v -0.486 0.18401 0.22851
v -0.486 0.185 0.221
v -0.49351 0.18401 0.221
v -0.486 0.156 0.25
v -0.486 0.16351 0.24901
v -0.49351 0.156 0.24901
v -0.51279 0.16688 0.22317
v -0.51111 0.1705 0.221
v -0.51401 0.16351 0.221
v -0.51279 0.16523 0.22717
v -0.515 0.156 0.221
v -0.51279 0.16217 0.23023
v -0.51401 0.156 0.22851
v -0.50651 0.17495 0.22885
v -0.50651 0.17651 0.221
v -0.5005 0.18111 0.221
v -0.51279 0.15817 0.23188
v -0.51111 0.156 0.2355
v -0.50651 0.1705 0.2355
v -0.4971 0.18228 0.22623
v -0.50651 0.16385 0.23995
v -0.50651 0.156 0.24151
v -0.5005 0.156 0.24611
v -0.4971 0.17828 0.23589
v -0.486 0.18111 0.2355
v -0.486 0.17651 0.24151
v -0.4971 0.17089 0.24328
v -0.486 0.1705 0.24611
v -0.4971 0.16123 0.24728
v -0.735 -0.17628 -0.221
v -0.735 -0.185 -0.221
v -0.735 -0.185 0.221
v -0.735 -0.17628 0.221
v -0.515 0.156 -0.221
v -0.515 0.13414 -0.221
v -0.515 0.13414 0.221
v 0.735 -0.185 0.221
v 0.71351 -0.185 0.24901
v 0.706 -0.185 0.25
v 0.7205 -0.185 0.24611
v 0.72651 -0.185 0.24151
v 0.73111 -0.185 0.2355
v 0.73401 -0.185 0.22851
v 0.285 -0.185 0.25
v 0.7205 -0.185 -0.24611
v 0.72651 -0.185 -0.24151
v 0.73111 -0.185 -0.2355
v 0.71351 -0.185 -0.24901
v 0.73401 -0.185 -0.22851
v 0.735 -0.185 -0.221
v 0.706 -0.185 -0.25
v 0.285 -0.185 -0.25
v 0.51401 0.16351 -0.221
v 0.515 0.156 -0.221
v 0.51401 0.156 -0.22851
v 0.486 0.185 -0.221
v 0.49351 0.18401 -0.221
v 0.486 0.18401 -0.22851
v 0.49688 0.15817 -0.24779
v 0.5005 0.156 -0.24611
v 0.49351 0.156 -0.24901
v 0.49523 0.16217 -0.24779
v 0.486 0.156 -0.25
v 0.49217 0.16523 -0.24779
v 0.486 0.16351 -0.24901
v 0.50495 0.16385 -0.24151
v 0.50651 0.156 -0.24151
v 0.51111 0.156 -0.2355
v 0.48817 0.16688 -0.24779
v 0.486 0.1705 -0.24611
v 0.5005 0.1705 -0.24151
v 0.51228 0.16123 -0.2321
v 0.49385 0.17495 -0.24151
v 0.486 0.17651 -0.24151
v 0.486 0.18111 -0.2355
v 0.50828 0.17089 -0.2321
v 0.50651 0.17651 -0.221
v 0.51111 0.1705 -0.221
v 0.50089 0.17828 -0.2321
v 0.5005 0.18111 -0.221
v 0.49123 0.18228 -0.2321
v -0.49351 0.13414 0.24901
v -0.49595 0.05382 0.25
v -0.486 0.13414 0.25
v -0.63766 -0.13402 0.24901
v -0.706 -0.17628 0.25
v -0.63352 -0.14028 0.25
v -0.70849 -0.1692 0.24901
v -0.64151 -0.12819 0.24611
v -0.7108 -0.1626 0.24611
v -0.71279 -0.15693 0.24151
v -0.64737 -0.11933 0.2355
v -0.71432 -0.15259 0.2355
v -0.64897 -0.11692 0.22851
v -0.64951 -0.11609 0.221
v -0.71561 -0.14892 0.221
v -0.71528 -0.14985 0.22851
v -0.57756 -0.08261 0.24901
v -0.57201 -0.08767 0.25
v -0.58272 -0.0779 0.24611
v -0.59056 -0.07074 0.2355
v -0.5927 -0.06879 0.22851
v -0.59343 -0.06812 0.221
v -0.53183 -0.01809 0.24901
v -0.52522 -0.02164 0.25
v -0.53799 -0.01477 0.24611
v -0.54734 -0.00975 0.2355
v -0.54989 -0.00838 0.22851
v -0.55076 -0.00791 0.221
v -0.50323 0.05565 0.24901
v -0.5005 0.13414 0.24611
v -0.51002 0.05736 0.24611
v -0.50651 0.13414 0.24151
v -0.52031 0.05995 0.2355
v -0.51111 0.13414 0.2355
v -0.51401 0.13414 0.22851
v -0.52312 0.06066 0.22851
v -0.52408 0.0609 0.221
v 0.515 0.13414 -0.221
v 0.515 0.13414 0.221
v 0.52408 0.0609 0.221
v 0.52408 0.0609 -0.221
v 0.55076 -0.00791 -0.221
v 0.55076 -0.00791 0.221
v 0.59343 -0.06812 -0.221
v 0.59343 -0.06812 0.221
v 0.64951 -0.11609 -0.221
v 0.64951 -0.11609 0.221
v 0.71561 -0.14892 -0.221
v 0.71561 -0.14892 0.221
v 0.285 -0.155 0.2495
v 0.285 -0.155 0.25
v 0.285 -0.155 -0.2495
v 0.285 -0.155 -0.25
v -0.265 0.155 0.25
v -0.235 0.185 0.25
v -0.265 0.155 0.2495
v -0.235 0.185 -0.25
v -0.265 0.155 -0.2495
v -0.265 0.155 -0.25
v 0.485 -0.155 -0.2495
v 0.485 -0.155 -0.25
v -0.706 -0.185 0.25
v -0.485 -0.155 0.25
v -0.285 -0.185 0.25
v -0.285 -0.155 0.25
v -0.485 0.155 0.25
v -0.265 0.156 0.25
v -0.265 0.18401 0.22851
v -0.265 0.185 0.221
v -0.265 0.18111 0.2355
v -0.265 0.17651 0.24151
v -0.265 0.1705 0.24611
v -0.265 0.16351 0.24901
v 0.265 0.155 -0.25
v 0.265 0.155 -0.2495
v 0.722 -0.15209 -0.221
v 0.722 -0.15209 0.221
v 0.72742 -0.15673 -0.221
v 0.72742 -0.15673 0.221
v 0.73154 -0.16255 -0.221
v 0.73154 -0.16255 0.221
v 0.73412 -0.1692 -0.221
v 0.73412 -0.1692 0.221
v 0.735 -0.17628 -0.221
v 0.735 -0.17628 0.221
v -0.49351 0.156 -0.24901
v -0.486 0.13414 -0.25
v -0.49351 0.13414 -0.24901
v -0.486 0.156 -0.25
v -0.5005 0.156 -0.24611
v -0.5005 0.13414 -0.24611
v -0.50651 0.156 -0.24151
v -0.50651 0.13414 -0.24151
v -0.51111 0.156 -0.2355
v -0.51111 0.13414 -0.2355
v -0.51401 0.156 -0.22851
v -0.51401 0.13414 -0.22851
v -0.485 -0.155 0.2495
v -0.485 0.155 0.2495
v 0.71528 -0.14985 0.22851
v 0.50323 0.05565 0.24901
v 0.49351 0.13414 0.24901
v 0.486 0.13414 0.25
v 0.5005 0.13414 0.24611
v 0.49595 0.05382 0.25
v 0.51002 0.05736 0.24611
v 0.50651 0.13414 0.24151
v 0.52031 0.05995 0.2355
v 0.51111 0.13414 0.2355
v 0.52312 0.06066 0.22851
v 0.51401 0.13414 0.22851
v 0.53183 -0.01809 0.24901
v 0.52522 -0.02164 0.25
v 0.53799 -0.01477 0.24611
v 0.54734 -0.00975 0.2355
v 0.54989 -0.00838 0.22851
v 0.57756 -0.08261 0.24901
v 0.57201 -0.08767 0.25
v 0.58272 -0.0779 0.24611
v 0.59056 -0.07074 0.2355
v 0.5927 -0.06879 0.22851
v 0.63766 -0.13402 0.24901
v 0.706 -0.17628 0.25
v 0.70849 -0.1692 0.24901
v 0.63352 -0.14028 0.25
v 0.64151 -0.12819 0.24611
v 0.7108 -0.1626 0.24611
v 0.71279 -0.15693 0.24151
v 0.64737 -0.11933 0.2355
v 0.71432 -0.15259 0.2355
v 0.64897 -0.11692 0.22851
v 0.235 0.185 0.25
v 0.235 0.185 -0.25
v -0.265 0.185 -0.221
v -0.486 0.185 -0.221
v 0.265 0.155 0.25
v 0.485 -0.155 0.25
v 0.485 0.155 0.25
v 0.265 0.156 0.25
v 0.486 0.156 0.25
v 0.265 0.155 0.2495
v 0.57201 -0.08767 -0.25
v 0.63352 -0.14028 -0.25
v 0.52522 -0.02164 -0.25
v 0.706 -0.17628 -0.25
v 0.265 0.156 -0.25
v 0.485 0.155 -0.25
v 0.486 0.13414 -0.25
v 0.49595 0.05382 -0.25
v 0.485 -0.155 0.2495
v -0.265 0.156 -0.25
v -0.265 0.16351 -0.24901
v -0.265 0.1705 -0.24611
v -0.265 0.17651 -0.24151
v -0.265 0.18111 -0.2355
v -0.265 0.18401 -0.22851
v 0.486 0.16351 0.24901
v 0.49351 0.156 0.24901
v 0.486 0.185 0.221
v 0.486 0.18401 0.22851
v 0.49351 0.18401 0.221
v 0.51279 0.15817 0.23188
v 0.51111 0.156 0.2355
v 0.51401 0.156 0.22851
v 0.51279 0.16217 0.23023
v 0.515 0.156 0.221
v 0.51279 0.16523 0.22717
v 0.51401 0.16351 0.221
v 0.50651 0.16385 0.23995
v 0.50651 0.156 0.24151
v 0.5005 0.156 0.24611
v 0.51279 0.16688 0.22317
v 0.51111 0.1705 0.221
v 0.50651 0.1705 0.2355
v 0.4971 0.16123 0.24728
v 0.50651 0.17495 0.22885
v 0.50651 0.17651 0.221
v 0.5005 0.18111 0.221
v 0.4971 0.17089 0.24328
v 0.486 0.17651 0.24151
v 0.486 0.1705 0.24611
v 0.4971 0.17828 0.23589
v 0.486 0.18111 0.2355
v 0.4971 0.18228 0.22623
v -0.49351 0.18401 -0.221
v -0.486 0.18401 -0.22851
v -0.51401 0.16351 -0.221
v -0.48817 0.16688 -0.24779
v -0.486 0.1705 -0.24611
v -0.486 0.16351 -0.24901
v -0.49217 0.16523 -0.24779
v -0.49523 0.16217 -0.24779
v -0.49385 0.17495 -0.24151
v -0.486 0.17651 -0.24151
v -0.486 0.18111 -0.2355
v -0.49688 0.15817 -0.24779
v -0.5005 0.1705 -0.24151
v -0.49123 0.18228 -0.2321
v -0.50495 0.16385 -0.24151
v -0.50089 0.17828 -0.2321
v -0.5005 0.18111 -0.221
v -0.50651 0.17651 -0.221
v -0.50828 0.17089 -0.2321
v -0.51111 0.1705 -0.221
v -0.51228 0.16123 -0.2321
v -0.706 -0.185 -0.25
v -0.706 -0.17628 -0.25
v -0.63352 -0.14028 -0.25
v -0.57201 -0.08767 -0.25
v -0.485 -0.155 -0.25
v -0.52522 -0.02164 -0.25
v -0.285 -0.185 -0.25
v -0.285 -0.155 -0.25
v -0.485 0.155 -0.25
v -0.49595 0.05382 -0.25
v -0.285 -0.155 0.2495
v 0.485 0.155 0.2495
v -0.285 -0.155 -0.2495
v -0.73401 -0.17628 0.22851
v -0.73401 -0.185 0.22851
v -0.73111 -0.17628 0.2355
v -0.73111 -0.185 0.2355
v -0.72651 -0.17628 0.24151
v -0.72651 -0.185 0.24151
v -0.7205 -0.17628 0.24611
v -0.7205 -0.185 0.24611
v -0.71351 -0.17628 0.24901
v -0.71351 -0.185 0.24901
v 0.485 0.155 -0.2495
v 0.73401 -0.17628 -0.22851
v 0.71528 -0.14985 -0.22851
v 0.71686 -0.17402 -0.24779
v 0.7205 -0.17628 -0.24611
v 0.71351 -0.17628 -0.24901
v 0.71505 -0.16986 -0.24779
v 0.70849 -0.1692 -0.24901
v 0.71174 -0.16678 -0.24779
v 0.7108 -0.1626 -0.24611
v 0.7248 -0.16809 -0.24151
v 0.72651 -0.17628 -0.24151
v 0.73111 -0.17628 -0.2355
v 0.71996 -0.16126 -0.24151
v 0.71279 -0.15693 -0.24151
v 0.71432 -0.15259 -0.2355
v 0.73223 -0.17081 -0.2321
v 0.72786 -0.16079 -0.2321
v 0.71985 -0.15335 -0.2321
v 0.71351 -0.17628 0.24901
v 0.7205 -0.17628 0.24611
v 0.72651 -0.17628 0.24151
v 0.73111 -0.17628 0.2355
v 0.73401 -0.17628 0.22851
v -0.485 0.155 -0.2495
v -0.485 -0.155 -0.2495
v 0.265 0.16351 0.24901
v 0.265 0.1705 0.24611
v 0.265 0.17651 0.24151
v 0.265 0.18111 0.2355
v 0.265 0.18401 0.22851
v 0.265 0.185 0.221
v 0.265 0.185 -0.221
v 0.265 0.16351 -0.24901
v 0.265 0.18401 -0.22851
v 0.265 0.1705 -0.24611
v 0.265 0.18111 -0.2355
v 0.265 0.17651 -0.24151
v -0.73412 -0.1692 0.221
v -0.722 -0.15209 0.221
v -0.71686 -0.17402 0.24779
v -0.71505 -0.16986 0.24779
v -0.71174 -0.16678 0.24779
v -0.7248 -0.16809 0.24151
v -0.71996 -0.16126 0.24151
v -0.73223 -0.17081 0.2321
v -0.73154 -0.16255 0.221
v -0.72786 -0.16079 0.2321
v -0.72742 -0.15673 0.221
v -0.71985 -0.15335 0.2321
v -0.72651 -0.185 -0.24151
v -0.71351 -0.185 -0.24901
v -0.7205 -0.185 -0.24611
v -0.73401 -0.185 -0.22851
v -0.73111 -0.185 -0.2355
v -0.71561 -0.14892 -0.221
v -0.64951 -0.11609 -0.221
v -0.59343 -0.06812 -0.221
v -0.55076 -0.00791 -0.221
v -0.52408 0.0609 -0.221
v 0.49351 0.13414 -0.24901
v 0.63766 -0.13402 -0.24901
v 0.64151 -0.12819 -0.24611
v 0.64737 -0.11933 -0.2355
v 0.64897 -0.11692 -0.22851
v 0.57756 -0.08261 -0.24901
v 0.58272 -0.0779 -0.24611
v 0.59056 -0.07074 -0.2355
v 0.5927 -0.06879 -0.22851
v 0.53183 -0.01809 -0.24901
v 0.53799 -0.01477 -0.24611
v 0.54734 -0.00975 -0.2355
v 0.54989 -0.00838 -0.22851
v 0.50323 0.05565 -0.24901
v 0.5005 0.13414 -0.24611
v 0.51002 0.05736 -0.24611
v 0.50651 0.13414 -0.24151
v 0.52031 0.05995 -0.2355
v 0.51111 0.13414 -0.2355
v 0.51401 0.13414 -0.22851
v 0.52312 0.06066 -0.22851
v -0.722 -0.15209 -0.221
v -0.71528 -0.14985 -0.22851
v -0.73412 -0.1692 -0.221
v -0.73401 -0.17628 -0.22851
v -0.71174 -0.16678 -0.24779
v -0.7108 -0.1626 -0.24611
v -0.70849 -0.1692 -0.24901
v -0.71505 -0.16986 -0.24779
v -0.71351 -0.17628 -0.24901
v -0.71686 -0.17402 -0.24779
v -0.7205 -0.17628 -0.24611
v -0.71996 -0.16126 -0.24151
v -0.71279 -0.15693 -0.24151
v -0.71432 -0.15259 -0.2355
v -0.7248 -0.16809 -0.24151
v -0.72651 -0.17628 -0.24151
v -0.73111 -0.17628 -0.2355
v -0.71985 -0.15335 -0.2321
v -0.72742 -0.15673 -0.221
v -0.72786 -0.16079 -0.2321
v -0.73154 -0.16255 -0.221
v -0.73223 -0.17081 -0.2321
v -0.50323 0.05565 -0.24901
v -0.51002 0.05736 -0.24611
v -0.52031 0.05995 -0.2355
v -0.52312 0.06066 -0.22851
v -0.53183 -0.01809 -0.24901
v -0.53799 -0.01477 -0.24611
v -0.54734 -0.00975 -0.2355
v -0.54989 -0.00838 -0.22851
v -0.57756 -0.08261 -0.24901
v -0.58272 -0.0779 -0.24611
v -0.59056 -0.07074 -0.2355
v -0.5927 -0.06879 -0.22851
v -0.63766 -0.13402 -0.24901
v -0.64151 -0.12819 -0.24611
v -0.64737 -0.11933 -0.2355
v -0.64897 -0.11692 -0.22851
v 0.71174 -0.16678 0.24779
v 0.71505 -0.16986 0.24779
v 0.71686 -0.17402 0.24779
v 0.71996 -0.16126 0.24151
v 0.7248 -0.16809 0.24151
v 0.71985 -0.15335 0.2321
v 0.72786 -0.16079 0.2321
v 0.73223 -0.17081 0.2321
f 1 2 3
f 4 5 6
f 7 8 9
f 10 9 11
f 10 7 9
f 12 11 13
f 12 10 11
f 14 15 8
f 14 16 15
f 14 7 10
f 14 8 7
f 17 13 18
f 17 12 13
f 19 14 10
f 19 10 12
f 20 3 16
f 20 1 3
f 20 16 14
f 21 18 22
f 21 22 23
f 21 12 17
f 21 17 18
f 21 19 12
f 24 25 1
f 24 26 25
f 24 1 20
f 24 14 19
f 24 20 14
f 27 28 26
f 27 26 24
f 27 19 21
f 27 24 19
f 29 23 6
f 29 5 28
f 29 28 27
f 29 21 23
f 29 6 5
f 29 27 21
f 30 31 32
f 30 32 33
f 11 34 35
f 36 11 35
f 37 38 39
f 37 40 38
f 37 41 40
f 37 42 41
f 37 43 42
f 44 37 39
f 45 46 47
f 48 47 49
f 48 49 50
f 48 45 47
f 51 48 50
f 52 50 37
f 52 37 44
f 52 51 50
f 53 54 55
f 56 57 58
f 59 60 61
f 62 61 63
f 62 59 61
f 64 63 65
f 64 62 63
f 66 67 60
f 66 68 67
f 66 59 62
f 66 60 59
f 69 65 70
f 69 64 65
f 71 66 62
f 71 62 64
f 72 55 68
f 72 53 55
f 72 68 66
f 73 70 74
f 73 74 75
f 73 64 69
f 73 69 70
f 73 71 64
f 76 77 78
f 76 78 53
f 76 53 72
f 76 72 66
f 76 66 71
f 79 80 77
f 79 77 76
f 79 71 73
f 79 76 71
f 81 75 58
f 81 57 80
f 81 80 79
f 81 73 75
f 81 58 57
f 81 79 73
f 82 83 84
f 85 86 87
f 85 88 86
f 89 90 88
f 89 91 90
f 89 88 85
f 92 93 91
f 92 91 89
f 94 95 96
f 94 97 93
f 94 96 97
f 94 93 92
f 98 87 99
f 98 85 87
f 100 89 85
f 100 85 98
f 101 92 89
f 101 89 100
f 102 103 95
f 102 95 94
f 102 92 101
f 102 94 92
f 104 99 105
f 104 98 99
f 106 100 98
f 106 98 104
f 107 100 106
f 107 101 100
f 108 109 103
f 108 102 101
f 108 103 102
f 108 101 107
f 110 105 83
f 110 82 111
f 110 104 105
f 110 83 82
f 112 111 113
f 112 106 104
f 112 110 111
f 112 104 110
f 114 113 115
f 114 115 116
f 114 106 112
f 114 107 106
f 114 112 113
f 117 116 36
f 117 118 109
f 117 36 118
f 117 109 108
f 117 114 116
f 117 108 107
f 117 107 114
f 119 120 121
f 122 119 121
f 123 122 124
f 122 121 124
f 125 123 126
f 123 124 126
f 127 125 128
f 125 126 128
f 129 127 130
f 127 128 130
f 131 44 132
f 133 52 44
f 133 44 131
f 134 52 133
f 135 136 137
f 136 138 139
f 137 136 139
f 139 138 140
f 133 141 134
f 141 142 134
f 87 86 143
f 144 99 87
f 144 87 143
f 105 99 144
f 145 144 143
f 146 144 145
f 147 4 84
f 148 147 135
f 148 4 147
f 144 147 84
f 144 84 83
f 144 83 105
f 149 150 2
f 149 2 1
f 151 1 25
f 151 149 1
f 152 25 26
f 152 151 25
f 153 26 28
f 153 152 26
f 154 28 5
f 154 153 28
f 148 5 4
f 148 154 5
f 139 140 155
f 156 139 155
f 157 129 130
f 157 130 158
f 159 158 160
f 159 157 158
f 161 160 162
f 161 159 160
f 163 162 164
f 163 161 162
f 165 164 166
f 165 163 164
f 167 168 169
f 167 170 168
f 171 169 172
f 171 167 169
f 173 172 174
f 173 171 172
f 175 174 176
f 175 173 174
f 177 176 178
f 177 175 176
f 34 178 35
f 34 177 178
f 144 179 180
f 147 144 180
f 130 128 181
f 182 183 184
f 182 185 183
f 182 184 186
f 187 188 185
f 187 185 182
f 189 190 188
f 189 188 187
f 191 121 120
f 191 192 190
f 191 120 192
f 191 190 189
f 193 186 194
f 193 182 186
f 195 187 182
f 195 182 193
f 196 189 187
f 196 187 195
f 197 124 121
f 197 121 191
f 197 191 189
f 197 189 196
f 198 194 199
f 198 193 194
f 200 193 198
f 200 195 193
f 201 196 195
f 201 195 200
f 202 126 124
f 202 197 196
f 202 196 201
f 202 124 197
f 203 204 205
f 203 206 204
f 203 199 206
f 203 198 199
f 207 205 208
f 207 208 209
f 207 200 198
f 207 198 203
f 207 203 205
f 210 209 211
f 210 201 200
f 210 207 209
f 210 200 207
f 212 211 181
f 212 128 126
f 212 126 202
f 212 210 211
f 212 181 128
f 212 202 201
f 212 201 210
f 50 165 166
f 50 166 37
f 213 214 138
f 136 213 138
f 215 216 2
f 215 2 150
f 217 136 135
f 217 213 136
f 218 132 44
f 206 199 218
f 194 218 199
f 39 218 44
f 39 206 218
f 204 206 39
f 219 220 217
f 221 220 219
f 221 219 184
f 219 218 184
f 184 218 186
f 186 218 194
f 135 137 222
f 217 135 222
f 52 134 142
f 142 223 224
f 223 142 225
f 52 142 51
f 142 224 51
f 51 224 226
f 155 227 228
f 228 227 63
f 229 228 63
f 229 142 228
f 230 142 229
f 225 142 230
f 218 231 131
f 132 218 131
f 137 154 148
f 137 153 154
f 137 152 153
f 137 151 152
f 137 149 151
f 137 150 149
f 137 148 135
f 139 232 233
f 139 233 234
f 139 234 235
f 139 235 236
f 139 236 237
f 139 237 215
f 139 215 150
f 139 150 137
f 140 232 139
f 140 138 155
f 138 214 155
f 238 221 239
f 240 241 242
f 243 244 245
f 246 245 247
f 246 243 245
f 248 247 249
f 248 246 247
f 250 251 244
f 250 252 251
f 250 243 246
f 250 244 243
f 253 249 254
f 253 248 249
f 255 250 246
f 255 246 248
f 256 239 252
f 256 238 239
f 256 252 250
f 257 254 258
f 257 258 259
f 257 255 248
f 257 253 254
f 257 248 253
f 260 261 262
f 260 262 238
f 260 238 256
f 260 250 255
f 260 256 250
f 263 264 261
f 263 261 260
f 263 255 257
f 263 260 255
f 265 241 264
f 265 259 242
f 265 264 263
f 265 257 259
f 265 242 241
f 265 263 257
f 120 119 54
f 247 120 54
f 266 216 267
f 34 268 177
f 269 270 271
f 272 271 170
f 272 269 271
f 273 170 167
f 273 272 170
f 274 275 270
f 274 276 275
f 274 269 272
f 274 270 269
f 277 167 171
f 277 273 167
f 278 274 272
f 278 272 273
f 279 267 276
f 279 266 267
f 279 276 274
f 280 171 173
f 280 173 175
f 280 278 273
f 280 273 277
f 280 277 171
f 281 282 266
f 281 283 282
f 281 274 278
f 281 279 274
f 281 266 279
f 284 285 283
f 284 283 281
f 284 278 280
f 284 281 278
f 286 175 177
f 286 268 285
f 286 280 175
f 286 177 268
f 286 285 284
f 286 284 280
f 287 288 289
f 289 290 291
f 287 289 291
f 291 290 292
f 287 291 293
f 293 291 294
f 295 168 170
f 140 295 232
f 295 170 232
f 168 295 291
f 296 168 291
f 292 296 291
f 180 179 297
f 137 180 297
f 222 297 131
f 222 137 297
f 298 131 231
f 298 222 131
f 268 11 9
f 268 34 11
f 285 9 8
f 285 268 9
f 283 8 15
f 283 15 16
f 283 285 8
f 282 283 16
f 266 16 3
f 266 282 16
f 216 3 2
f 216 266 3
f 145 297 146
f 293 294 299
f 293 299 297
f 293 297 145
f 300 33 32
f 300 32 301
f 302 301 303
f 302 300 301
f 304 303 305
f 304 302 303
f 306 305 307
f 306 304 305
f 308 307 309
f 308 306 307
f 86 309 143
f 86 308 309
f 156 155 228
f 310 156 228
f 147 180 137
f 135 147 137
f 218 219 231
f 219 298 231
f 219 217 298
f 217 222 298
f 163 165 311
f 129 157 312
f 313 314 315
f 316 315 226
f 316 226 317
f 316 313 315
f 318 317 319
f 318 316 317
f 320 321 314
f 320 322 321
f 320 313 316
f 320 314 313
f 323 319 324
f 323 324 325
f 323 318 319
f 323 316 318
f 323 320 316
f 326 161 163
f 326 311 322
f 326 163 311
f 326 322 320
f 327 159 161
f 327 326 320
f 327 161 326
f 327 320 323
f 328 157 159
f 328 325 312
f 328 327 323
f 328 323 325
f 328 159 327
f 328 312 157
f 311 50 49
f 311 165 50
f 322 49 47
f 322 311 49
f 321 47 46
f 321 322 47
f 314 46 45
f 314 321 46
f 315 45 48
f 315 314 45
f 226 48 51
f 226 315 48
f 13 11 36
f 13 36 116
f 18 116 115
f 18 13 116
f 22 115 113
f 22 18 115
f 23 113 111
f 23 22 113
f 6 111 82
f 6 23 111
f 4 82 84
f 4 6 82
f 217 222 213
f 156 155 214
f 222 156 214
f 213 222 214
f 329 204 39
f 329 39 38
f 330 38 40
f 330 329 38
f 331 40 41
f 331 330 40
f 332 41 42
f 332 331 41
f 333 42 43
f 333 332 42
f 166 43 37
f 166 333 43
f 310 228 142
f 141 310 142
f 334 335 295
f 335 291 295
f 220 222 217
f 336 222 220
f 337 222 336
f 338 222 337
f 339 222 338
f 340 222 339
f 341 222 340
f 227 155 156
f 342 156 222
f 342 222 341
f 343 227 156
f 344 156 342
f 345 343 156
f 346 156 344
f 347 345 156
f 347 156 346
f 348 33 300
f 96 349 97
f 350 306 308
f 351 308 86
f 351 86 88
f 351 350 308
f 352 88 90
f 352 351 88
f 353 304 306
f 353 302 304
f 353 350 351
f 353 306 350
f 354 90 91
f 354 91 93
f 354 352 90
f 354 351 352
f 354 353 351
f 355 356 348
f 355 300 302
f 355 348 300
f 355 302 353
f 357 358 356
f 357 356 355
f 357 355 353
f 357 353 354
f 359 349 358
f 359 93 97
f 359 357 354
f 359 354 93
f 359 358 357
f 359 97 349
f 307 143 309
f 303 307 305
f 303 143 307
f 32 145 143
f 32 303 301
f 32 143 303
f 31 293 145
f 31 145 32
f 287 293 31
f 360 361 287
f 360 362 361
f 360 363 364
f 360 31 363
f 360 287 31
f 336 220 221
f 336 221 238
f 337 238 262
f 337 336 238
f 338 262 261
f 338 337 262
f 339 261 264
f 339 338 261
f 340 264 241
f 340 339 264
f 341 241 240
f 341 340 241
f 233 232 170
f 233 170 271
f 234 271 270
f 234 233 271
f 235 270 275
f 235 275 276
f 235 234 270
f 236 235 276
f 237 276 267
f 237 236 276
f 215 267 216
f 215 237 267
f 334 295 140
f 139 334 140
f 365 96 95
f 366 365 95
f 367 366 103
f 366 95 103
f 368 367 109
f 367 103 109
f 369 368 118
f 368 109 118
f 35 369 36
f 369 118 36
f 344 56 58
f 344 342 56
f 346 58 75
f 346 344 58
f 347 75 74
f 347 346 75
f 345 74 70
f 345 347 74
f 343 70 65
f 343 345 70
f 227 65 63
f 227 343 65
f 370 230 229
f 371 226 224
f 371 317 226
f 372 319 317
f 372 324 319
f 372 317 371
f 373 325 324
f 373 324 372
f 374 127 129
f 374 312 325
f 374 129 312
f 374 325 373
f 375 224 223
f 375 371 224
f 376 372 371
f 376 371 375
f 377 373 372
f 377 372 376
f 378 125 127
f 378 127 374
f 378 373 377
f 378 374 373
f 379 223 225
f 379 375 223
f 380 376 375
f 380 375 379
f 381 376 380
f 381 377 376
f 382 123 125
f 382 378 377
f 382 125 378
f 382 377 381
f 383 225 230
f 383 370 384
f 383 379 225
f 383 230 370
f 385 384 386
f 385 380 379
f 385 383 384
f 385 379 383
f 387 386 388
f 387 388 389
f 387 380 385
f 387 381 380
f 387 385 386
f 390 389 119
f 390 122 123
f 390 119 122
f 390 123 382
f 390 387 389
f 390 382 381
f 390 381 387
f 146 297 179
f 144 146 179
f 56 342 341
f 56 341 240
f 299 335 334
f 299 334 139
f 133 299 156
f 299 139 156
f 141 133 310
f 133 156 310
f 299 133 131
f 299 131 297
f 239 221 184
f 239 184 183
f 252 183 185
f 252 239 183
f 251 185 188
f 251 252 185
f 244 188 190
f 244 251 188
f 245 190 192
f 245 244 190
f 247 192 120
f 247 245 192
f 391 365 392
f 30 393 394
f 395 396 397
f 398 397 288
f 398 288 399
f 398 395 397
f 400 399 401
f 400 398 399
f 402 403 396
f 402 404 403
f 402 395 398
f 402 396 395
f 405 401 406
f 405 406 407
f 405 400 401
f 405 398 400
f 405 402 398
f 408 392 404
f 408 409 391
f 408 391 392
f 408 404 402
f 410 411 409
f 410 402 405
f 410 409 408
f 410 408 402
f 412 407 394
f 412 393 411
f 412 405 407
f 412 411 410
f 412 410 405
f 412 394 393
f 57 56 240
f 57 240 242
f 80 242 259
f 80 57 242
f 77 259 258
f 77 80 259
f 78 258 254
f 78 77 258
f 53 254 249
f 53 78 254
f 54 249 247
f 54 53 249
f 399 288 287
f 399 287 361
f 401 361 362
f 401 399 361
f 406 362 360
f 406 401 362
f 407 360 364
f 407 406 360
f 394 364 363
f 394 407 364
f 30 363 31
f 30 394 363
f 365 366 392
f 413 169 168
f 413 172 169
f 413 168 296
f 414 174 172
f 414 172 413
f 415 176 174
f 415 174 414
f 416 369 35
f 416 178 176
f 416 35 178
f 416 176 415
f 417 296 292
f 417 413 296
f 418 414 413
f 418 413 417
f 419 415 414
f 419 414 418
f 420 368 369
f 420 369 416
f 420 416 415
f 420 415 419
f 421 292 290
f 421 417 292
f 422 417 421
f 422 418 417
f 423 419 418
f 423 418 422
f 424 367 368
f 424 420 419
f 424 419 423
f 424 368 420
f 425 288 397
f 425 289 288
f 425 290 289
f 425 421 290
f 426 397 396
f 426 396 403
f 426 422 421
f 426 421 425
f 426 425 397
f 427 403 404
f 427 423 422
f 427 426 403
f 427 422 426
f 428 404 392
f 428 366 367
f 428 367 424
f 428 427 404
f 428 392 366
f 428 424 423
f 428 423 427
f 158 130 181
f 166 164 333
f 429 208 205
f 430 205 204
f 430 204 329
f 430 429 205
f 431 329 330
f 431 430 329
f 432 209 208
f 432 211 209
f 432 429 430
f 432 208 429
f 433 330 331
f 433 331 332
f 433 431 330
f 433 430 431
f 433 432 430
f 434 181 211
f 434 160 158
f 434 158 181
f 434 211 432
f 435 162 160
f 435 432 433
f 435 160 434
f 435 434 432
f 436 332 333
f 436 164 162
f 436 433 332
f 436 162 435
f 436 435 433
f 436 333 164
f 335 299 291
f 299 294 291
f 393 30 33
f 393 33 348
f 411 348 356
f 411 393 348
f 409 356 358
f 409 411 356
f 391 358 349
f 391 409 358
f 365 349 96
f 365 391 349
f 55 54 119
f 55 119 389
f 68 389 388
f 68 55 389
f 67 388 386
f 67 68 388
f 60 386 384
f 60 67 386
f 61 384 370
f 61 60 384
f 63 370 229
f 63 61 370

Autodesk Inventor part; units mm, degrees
ref_plane "YZ Plane" through (0, 0, 0) normal (1, 0, 0) x (0, 1, 0)
ref_plane "XZ Plane" through (0, 0, 0) normal (0, 1, 0) x (-1, 0, 0)
ref_plane "XY Plane" through (0, 0, 0) normal (0, 0, 1) x (1, 0, 0)
sketch "Sketch10" plane through (0, 0, 0) normal (0, 0, 1) x (1, 0, 0)
  line L0 (-0.485, 0.155) -> (0.485, 0.155)
  line L1 (0.485, 0.155) -> (0.485, -0.155)
  line L2 (0.485, -0.155) -> (-0.485, -0.155)
  line L3 (-0.485, -0.155) -> (-0.485, 0.155)
  line L4 (-0.265, 0.155) -> (-0.485, 0.155)
  line L5 (-0.515, 0.185) -> (-0.265, 0.185)
  line L6 (-0.265, 0.185) -> (-0.265, 0.155)
  line L7 (-0.515, 0.185) -> (-0.515, -0.155)
  line L8 (-0.485, -0.155) -> (-0.485, 0.155)
  line L9 (-0.285, -0.155) -> (-0.285, -0.185)
  line L10 (-0.285, -0.185) -> (-0.735, -0.185)
  line L11 (-0.735, -0.185) -> (-0.735, -0.155)
  line L12 (-0.735, -0.155) -> (-0.515, -0.155)
  line L13 (-0.485, -0.155) -> (-0.285, -0.155)
  line L14 (-0.265, 0.155) -> (0.265, 0.155)
  line L15 (0.265, 0.155) -> (0.235, 0.185)
  line L16 (0.235, 0.185) -> (-0.235, 0.185)
  line L17 (-0.235, 0.185) -> (-0.265, 0.155)
  point P0 (0, 0)
  point P1 (0, 0.155)
  point P2 (-0.485, 0)
  point P3 (0, 0.185)
  dimension "d11" = 0.2
  dimension "d12" = 0.45
  dimension "d13" = 0.03
  dimension "d14" = 0.03
  dimension "d15" = 0.25
  dimension "d16" = 45
  dimension "d19" = 0.03
  dimension "d21" = 1
  dimension "d22" = 0.37
extrude "Extrusion4" add sketch "Sketch10" along normal mid plane 0.499 contours L0 L1 L2 L3
extrude "Extrusion5" add sketch "Sketch10" along normal mid plane 0.5 contours L3 L2 L9 L10 L11 L12 L7 L5 L6 L0 | L17 L16 L15 L0
fillet "Fillet2" radius 0.3 1 edges at (-0.515, -0.155, 0)
fillet "Fillet3" radius 0.029 10 edges at (-0.39, 0.185, 0.25) (-0.515, 0.185, 0) (-0.39, 0.185, -0.25) (-0.5763, -0.0475, -0.25) (-0.515, 0.1596, -0.25) (-0.5763, -0.0475, 0.25) (-0.515, 0.1596, 0.25) (-0.735, -0.17, 0.25) (-0.735, -0.155, 0) (-0.735, -0.17, -0.25)
mirror "Mirror1" about plane through (0, 0, 0) normal (1, 0, 0) of "Extrusion5", "Fillet2", "Fillet3"
equation "\"d14\" = d13"
equation "\"d19\" = d13"
properties part number "AC0402JR-0724KL Resistor"
